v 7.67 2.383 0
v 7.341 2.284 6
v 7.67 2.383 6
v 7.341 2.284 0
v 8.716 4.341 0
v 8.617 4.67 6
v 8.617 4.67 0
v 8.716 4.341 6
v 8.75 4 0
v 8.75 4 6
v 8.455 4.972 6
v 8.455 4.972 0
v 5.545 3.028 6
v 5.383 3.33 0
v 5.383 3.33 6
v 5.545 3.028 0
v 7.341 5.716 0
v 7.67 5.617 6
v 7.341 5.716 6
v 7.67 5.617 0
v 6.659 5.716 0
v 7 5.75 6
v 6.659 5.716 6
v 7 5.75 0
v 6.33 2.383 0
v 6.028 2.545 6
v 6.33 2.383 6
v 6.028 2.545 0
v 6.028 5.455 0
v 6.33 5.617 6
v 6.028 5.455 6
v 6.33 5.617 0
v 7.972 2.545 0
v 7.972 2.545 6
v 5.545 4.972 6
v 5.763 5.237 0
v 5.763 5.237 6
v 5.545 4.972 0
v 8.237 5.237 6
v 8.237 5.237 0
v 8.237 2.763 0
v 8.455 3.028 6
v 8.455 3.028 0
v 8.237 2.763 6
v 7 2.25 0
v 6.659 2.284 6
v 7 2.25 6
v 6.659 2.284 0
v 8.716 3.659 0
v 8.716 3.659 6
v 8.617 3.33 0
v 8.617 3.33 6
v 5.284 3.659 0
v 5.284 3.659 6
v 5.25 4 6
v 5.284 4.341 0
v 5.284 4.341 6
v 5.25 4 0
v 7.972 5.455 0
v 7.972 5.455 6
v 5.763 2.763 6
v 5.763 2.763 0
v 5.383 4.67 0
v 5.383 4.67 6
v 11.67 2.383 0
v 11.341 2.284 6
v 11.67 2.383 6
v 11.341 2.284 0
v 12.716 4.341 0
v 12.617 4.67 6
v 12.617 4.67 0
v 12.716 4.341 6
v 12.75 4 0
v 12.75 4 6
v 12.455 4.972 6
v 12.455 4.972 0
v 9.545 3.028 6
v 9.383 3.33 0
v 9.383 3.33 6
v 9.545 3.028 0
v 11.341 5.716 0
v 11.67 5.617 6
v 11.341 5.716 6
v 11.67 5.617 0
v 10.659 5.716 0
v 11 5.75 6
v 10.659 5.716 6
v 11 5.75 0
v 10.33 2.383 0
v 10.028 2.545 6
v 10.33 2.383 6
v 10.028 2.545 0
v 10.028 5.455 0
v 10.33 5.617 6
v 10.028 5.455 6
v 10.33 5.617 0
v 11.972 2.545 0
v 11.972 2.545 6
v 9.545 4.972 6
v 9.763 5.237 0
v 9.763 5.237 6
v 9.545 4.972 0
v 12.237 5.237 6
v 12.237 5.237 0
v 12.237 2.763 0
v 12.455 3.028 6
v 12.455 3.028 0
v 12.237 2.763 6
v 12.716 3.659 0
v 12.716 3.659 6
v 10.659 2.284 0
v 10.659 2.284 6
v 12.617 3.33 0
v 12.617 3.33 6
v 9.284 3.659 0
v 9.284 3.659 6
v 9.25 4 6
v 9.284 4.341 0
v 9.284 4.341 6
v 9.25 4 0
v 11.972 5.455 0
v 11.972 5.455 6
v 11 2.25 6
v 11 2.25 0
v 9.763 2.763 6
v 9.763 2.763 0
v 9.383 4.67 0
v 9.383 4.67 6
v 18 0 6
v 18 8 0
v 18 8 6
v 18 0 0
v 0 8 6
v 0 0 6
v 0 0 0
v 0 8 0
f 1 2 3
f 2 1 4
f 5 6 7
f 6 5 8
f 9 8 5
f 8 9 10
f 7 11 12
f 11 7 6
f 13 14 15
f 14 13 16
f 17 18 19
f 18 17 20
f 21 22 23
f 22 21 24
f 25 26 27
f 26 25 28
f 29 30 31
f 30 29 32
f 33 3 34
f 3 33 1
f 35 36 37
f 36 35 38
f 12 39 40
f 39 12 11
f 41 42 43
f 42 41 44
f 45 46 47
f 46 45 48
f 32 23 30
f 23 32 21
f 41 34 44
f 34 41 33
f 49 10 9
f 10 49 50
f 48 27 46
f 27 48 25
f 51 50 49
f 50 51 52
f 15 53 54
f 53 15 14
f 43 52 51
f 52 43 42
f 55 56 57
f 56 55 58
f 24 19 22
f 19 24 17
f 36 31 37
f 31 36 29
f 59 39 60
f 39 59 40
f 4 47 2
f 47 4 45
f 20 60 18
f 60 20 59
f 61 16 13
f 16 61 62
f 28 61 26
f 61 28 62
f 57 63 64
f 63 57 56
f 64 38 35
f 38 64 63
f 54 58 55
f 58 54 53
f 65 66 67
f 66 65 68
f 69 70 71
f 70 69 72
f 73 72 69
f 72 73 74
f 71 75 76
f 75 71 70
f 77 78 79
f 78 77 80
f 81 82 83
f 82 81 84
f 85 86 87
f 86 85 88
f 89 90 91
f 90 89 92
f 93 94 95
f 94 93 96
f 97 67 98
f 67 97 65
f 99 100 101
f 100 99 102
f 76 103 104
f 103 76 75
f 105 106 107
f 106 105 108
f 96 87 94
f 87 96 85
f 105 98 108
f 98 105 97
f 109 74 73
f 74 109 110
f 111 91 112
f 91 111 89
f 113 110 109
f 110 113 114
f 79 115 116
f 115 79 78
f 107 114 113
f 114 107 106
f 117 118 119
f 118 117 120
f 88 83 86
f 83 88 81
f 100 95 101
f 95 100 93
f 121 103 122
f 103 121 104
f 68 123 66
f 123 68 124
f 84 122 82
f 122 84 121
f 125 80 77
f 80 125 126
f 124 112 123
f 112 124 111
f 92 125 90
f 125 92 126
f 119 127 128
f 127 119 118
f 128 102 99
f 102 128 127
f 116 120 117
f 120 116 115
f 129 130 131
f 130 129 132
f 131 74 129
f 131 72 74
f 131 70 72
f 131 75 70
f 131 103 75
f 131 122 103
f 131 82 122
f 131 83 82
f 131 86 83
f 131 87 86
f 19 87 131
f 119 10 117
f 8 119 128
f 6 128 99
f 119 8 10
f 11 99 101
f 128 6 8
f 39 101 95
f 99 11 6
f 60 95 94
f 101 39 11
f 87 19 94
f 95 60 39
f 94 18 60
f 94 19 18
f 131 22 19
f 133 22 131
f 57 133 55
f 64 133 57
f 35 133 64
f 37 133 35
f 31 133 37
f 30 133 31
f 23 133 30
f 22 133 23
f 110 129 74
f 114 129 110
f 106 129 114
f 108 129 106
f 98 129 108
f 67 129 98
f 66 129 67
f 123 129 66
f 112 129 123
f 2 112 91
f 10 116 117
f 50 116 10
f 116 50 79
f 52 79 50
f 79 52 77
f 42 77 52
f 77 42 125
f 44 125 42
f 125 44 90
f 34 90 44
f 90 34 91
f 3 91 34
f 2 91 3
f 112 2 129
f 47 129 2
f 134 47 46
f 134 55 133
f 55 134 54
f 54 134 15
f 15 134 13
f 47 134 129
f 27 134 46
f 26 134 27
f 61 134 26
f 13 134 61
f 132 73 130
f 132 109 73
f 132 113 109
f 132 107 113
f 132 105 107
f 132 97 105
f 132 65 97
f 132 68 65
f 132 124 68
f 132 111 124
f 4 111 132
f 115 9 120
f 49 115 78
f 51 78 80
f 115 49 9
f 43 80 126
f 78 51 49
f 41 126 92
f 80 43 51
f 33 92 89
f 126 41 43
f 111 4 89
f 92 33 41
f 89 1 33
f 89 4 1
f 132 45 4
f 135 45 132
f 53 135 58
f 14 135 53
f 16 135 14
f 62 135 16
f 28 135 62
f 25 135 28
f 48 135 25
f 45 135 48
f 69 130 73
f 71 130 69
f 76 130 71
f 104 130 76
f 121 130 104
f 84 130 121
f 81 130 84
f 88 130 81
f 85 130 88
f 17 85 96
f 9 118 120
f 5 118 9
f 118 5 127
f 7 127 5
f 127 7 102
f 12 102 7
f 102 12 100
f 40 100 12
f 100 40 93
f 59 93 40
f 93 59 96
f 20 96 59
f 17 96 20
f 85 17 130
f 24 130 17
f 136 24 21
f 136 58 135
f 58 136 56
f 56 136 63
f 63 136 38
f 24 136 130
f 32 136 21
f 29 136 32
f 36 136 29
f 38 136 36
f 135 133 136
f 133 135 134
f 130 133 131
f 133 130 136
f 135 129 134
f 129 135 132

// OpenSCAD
$fn = 32;

// ----------------------------------------------------------------------
// Micro pad: two-hole pad, 5-20 mm class
// ----------------------------------------------------------------------

// --- parameters (mm) ---
pad_l = 18;               // pad length, X
pad_w = 8;                // pad width, Y
pad_t = 6;                // pad thickness, Z
hole_d = 3.5;             // hole diameter
hole_x = 7;               // X of the first hole centre
fit_tol = 0.02;           // tolerance for press fits, mm
free_tol = 0.2;           // tolerance for clearance fits, mm

difference() {
  cube([pad_l, pad_w, pad_t]);
  for (x = [hole_x, pad_l - hole_x])
    translate([x, pad_w / 2, -1])
      cylinder(h = pad_t + 2, d = hole_d);
}
